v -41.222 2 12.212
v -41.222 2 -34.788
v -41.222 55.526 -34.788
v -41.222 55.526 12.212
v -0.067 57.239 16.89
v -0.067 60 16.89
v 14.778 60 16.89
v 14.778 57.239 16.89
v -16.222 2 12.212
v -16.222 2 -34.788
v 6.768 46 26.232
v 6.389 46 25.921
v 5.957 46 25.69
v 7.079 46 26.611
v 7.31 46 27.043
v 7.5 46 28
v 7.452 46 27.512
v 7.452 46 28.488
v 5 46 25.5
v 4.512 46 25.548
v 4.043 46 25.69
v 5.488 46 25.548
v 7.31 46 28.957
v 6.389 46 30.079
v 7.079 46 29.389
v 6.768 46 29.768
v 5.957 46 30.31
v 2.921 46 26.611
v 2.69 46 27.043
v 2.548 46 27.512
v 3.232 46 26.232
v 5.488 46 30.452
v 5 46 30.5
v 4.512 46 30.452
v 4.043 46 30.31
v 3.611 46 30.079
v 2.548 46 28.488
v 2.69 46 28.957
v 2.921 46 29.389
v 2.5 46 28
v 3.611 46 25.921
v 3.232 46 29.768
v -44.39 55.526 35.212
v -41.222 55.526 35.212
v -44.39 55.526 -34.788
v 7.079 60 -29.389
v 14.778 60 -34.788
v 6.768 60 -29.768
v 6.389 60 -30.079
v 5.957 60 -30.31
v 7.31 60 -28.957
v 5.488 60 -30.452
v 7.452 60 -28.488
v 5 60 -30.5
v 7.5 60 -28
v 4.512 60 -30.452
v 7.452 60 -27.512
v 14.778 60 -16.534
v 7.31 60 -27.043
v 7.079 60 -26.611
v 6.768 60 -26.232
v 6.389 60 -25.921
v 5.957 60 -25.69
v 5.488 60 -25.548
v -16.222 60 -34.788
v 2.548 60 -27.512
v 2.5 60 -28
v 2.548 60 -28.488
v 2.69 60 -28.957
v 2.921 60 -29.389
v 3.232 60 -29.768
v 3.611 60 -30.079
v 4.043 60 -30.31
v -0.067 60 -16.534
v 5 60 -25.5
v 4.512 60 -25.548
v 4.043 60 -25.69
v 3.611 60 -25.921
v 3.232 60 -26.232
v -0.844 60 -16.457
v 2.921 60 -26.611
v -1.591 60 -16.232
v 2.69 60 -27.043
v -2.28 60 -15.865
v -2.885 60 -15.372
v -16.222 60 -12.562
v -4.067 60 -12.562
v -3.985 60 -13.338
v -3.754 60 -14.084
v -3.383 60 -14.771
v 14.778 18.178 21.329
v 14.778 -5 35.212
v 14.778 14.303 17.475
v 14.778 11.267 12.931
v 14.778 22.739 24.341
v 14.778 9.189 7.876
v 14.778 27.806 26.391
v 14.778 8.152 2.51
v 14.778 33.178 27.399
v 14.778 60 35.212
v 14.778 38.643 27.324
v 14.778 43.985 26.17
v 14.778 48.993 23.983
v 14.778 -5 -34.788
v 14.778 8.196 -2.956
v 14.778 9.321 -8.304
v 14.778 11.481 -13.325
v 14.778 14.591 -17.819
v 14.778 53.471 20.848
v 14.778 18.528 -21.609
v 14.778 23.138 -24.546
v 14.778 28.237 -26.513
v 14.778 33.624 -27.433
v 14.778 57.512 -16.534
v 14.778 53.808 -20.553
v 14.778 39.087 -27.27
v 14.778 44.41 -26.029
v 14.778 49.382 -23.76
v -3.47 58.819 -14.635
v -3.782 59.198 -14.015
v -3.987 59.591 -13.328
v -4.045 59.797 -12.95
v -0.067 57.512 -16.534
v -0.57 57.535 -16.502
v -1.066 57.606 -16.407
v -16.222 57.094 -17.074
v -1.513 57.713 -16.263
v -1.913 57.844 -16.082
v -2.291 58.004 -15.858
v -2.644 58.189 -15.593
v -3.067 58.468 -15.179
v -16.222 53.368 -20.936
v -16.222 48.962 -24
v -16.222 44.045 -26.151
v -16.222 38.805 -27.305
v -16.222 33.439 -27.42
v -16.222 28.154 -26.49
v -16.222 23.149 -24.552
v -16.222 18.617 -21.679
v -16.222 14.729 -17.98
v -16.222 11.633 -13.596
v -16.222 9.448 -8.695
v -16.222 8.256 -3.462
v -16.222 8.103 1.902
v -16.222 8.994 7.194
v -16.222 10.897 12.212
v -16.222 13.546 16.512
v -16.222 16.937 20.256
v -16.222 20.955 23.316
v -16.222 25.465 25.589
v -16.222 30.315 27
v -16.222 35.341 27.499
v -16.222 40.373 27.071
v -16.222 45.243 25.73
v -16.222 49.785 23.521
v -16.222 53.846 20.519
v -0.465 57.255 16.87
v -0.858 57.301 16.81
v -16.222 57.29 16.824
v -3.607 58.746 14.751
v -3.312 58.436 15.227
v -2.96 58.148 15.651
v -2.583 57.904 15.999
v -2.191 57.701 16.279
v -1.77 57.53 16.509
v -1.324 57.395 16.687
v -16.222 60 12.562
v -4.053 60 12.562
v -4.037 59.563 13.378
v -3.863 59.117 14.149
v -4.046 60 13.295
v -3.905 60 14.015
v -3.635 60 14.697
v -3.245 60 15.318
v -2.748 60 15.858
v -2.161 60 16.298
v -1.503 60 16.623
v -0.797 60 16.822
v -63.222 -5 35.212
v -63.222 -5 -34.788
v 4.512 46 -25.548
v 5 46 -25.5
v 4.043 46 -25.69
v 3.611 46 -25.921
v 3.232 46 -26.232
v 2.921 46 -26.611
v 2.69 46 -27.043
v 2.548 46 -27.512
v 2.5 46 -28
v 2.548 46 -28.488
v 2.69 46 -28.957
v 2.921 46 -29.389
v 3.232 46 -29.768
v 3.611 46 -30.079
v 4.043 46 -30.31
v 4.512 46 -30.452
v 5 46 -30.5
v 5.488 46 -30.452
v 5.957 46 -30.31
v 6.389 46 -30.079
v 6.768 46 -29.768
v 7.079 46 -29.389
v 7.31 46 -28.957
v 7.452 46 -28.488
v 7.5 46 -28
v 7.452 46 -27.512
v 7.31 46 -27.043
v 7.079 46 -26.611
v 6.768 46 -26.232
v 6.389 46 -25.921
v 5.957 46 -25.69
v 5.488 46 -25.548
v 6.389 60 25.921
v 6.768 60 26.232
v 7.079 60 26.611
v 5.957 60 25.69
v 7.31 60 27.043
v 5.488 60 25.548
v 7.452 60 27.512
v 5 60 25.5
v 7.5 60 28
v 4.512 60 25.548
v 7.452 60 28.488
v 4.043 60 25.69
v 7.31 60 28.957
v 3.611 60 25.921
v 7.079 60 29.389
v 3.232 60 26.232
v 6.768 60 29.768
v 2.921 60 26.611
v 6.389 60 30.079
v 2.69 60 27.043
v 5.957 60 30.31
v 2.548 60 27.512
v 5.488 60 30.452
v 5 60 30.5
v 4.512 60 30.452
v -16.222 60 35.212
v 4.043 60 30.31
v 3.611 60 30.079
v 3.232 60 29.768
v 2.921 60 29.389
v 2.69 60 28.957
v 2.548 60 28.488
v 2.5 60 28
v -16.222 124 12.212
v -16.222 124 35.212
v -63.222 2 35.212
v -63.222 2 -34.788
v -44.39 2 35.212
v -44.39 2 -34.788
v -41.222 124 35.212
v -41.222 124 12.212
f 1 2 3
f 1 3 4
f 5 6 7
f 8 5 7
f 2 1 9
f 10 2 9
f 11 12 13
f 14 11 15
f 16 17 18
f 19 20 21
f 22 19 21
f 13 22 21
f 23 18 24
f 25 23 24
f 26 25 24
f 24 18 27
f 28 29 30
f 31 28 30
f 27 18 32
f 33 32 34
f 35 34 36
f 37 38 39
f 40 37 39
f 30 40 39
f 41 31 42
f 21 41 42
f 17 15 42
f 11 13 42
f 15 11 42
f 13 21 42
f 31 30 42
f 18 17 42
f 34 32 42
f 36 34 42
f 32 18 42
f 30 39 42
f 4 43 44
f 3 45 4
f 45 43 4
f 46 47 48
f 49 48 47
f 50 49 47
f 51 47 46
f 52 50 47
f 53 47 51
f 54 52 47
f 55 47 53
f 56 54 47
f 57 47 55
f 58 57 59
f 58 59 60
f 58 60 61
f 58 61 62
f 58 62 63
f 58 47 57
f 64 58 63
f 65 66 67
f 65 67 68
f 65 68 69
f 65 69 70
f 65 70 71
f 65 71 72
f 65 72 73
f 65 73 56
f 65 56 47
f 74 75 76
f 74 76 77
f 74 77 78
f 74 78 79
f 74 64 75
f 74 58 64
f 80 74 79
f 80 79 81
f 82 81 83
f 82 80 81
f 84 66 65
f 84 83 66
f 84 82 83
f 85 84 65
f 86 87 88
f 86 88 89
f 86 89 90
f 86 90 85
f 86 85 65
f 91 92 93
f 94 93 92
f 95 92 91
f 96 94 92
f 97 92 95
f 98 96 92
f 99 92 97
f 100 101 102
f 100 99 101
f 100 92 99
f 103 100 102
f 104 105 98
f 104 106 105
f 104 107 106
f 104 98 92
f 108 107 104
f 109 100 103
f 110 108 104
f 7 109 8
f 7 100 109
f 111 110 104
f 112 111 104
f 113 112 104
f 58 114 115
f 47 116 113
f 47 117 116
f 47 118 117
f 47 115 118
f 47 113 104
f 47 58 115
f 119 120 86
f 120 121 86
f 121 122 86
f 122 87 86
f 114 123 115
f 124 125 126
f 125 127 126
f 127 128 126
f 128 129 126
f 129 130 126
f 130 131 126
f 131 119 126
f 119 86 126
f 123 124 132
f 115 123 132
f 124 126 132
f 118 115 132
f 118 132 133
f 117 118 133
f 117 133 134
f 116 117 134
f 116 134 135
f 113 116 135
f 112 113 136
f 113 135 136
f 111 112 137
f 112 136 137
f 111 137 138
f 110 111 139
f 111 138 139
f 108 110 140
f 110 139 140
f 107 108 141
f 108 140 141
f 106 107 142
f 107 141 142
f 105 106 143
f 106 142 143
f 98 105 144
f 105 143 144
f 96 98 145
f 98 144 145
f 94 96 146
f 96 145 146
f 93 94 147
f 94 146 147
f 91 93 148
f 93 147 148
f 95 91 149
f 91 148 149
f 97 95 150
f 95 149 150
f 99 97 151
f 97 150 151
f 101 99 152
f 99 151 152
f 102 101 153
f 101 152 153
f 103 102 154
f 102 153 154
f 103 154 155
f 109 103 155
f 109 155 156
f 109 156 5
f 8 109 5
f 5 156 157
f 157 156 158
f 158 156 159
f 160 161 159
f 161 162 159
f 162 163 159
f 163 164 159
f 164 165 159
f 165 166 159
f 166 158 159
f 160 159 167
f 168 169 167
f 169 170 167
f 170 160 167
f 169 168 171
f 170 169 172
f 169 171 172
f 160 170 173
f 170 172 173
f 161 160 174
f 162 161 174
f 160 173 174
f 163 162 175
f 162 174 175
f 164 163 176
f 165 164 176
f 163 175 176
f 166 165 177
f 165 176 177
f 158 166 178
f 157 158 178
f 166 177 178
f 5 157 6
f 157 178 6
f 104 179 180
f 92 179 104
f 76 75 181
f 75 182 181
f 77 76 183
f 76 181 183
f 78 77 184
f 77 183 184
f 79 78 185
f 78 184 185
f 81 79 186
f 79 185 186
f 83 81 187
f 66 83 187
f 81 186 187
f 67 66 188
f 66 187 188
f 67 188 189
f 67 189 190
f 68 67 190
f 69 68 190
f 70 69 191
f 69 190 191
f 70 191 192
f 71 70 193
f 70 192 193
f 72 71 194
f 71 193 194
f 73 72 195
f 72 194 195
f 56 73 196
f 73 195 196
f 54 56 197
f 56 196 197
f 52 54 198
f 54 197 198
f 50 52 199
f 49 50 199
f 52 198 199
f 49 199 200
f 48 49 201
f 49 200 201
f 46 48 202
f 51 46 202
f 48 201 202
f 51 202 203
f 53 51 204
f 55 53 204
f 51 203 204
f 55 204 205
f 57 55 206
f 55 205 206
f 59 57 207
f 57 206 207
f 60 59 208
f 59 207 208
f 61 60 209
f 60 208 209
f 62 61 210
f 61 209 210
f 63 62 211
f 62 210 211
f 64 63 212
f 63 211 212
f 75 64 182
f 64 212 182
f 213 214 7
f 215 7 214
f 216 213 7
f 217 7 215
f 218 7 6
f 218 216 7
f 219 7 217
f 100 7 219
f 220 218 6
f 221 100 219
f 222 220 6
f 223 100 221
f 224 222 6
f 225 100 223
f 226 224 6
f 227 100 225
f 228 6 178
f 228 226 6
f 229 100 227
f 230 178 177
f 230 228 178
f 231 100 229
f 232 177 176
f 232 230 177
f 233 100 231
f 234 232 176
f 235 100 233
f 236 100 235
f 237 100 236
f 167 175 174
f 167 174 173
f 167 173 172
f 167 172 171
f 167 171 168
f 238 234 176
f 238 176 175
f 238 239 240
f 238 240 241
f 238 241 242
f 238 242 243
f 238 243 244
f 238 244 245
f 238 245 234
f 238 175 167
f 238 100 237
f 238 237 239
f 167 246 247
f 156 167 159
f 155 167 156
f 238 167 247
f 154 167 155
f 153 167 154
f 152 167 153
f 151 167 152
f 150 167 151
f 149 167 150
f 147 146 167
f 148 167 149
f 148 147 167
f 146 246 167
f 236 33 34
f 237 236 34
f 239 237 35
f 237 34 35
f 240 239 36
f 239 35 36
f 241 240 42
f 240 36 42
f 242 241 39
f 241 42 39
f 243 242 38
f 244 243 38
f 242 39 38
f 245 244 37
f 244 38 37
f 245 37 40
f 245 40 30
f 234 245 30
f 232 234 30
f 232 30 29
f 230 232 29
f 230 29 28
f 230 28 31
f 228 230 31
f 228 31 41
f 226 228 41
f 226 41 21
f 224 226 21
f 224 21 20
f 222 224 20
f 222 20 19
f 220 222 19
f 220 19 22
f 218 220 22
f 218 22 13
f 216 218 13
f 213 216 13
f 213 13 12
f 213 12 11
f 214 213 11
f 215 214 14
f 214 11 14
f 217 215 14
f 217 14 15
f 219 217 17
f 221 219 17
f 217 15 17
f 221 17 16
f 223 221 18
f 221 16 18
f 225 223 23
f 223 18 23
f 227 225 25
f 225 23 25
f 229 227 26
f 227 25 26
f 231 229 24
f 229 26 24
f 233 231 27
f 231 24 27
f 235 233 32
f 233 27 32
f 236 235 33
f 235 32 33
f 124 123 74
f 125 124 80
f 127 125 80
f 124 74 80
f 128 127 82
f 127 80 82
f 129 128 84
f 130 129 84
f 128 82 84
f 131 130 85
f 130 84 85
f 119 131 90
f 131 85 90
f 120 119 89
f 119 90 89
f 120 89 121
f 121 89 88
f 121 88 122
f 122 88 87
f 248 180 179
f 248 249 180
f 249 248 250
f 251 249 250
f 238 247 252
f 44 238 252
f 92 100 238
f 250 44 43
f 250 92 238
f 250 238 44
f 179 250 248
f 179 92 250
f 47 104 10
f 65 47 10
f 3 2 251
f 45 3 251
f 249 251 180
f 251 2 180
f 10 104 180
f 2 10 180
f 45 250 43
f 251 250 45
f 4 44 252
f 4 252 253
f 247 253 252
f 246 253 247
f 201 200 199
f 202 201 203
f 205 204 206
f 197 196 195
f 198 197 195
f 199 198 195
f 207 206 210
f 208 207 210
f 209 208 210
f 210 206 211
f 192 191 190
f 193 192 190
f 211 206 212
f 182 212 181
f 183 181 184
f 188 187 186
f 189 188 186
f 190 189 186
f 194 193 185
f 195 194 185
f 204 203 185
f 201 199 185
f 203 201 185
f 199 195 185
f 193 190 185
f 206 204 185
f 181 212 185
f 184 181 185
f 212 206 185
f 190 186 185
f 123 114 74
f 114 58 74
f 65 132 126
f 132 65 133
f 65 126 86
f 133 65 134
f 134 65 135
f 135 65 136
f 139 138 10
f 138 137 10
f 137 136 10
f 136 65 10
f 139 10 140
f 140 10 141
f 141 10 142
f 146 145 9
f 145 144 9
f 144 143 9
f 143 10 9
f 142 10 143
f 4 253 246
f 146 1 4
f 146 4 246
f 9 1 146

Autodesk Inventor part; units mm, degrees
ref_plane "YZ Plane" through (0, 0, 0) normal (1, 0, 0) x (0, 1, 0)
ref_plane "XZ Plane" through (0, 0, 0) normal (0, 1, 0) x (-1, 0, 0)
ref_plane "XY Plane" through (0, 0, 0) normal (0, 0, 1) x (1, 0, 0)
sketch "Sketch1" plane through (0, 0, 0) normal (0, 1, 0) x (-1, 0, 0)
  line L0 (16.2222, 35.2121) -> (-14.7778, 35.2121)
  line L1 (-14.7778, 35.2121) -> (-14.7778, -34.7879)
  line L2 (-14.7778, -34.7879) -> (16.2222, -34.7879)
  line L3 (16.2222, -34.7879) -> (16.2222, 35.2121)
  point P0 (0, 0)
  dimension "d0" = 70
  dimension "d1" = 31
extrude "Extrusion1" add sketch "Sketch1" along normal blind 60
sketch "Sketch3" plane through (14.7778, 0, 35.2121) normal (1, 0, 0) x (0, 0, -1)
  circle A0 centre (35.2121, 35.5368) radius 27.5
  point P0 (35.2121, 0)
  dimension "d5" = 55
hole "Hole1" at (14.7778, 35.5368, 0) direction (-1, 0, 0) diameter 55 end through all
sketch "Sketch6" plane through (0, 60, 0) normal (0, 1, 0) x (1, 0, 0)
  line L0 (-0.0667, -13.4045) -> (-0.0667, 12.7365)
  line L1 (-16.2222, 0) -> (14.7778, 0) construction
  circle A0 centre (-0.0667, -12.8895) radius 4
  circle A1 centre (-0.0667, 12.5336) radius 4
  point P0 (0, 0)
  point P1 (14.7778, -12.562)
  point P2 (-16.2222, -12.562)
  point P3 (-16.2222, 12.562)
  point P4 (14.7778, 12.562)
  dimension "d42" = 8
  dimension "d43" = 8
sketch "Sketch8" plane through (0, 60, 0) normal (0, 1, 0) x (1, 0, 0)
  line L0 (14.7778, 34.7879) -> (-16.2222, 34.7879) construction
  line L1 (-16.2222, 0) -> (14.7778, 0) construction
  circle A0 centre (5, -28) radius 2
  circle A1 centre (5, 28) radius 2
  point P0 (0, 0)
  dimension "d33" = 4
extrude "Extrusion4" cut sketch "Sketch6" against normal blind 4
sketch "Sketch15" plane through (0, 60, 0) normal (0, 1, 0) x (1, 0, 0)
  arc A0 (-4.0532, -12.562) -> (3.9199, -12.562) centre (-0.0667, -12.8895) ccw projected
  line L0 (-0.0667, -16.8895) -> (14.7778, -16.8895)
  line L1 (14.7778, 27.5) -> (14.7778, -27.5) projected
  line L2 (14.7778, -12.562) -> (14.7778, -16.8895)
  line L3 (14.7778, -12.562) -> (3.9199, -12.562) projected
  line L4 (-0.0667, -12.8895) -> (-0.0667, -12.8895)
  arc A1 (3.9332, 12.562) -> (-4.0666, 12.562) centre (-0.0667, 12.5336) ccw projected
  line L5 (-0.0667, 16.5336) -> (-0.0667, 12.5336)
  line L6 (3.9332, 12.562) -> (14.7778, 12.562) projected
  line L7 (14.7778, 12.562) -> (14.7778, 16.5336)
  line L8 (14.7778, 16.5336) -> (-0.0667, 16.5336)
  line L9 (-0.0667, -12.562) -> (14.7778, -12.562)
  line L10 (-0.0667, -12.562) -> (-0.0667, -16.8895)
  line L11 (14.7778, 12.562) -> (-0.0667, 12.5336)
  point P0 (0, 0)
extrude "Extrusion5" cut sketch "Sketch15" against normal blind 4 contours A0 L3 L1 L0 | L1 L6 A1 L8
hole "Hole5" at (5, 60, 28) at (5, 60, -28) direction (0, -1, 0) diameter 5 depth 14
sketch "Sketch18" plane through (0, 0, 0) normal (0, -1, 0) x (1, 0, 0)
  line L0 (-16.2222, -34.7879) -> (-63.2222, -34.7879)
  line L1 (-16.2222, 35.2121) -> (-63.2222, 35.2121)
  line L2 (-63.2222, 35.2121) -> (-63.2222, -34.7879)
  line L3 (-16.2222, -34.7879) -> (-16.2222, 35.2121)
  line L4 (-63.2222, -34.7879) -> (-63.2222, 35.2121)
  point P0 (0, 0)
  dimension "d57" = 47
extrude "Extrusion9" add sketch "Sketch18" against normal blind 2
sketch "Sketch25" plane through (0, 0, 0) normal (0, -1, 0) x (1, 0, 0)
  line L0 (-63.2222, 35.2121) -> (14.7778, 35.2121)
  line L1 (14.7778, 35.2121) -> (14.7778, -34.7879)
  line L2 (14.7778, -34.7879) -> (-63.2222, -34.7879)
  line L3 (-63.2222, -34.7879) -> (-63.2222, 35.2121)
  point P0 (0, 0)
extrude "Extrusion11" add sketch "Sketch25" along normal blind 5
sketch "Sketch29" plane through (0, 2, 0) normal (0, 1, 0) x (1, 0, 0)
  point P0 (0, 0)
sketch "Sketch37" plane through (0, 2, 0) normal (0, 1, 0) x (1, 0, 0)
  point P0 (0, 0)
sketch "Sketch39" plane through (0, 2, 0) normal (0, 1, 0) x (1, 0, 0)
  line L0 (-16.2222, -35.2121) -> (-41.2222, -35.2121)
  line L1 (-41.2222, -35.2121) -> (-41.2222, -12.2121)
  line L2 (-41.2222, -12.2121) -> (-16.2222, -12.2121)
  line L3 (-16.2222, -12.2121) -> (-16.2222, -35.2121)
  point P0 (0, 0)
  dimension "d120" = 25
  dimension "d121" = 23
extrude "Extrusion27" add sketch "Sketch39" along normal blind 122
sketch "Sketch43" plane through (0, 2, 0) normal (0, 1, 0) x (1, 0, 0)
  line L0 (-16.2222, 34.7879) -> (-63.2222, 34.7879) projected
  line L1 (-41.2222, -35.2121) -> (-44.39, -35.2121)
  line L2 (-44.39, -35.2121) -> (-44.39, 34.7879)
  line L3 (-44.39, 34.7879) -> (-41.2222, 34.7879)
  line L4 (-41.2222, 34.7879) -> (-41.2222, -35.2121)
  point P0 (0, 0)
extrude "Extrusion28" add sketch "Sketch43" along normal blind 53.526
properties part number "BF_base_model"
